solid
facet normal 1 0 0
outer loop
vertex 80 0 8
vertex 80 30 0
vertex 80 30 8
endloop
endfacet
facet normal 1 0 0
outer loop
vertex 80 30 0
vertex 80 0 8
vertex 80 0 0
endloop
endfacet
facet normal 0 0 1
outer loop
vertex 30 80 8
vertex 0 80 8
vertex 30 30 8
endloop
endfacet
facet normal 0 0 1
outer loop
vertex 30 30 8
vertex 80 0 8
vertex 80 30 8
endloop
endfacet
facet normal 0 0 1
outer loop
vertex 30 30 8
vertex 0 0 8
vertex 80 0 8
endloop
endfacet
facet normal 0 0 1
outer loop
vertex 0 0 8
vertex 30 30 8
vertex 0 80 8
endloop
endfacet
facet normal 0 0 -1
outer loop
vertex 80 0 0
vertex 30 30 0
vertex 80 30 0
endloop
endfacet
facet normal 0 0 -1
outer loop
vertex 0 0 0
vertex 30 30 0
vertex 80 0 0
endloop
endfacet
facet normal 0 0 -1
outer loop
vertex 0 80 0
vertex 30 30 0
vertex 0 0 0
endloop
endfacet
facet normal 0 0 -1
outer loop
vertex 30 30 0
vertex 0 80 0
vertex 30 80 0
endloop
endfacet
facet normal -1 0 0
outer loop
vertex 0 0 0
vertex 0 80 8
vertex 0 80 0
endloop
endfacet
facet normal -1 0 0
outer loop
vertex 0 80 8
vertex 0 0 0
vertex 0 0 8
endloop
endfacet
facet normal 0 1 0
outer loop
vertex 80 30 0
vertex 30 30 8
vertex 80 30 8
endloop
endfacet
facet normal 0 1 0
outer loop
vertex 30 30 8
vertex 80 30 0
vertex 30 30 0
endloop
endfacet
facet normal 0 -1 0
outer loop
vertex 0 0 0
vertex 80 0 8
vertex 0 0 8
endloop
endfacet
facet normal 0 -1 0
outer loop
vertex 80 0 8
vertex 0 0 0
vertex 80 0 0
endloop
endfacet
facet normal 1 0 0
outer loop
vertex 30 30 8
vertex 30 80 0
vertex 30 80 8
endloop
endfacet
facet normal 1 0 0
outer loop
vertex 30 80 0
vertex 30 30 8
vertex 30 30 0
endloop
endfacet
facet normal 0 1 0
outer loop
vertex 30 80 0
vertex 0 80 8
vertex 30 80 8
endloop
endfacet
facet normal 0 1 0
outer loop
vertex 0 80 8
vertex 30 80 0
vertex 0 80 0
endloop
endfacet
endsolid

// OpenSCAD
// test_lshape.scad
// Ground truth: L-shape with 80×80mm bounding box, 30mm arm width
// Validates: concave corner handling (the inner corner is the hard case)
//
// Geometry:
//   full bbox  80 × 80
//   horizontal arm: 80 × 30  (bottom)
//   vertical arm:   30 × 80  (left)
//   cutout:         50 × 50  (top-right)

bbox_x    = 80;
bbox_y    = 80;
arm_w     = 30;
height    = 8;

union() {
    cube([bbox_x, arm_w, height]);           // horizontal arm
    cube([arm_w,  bbox_y, height]);          // vertical arm
}
